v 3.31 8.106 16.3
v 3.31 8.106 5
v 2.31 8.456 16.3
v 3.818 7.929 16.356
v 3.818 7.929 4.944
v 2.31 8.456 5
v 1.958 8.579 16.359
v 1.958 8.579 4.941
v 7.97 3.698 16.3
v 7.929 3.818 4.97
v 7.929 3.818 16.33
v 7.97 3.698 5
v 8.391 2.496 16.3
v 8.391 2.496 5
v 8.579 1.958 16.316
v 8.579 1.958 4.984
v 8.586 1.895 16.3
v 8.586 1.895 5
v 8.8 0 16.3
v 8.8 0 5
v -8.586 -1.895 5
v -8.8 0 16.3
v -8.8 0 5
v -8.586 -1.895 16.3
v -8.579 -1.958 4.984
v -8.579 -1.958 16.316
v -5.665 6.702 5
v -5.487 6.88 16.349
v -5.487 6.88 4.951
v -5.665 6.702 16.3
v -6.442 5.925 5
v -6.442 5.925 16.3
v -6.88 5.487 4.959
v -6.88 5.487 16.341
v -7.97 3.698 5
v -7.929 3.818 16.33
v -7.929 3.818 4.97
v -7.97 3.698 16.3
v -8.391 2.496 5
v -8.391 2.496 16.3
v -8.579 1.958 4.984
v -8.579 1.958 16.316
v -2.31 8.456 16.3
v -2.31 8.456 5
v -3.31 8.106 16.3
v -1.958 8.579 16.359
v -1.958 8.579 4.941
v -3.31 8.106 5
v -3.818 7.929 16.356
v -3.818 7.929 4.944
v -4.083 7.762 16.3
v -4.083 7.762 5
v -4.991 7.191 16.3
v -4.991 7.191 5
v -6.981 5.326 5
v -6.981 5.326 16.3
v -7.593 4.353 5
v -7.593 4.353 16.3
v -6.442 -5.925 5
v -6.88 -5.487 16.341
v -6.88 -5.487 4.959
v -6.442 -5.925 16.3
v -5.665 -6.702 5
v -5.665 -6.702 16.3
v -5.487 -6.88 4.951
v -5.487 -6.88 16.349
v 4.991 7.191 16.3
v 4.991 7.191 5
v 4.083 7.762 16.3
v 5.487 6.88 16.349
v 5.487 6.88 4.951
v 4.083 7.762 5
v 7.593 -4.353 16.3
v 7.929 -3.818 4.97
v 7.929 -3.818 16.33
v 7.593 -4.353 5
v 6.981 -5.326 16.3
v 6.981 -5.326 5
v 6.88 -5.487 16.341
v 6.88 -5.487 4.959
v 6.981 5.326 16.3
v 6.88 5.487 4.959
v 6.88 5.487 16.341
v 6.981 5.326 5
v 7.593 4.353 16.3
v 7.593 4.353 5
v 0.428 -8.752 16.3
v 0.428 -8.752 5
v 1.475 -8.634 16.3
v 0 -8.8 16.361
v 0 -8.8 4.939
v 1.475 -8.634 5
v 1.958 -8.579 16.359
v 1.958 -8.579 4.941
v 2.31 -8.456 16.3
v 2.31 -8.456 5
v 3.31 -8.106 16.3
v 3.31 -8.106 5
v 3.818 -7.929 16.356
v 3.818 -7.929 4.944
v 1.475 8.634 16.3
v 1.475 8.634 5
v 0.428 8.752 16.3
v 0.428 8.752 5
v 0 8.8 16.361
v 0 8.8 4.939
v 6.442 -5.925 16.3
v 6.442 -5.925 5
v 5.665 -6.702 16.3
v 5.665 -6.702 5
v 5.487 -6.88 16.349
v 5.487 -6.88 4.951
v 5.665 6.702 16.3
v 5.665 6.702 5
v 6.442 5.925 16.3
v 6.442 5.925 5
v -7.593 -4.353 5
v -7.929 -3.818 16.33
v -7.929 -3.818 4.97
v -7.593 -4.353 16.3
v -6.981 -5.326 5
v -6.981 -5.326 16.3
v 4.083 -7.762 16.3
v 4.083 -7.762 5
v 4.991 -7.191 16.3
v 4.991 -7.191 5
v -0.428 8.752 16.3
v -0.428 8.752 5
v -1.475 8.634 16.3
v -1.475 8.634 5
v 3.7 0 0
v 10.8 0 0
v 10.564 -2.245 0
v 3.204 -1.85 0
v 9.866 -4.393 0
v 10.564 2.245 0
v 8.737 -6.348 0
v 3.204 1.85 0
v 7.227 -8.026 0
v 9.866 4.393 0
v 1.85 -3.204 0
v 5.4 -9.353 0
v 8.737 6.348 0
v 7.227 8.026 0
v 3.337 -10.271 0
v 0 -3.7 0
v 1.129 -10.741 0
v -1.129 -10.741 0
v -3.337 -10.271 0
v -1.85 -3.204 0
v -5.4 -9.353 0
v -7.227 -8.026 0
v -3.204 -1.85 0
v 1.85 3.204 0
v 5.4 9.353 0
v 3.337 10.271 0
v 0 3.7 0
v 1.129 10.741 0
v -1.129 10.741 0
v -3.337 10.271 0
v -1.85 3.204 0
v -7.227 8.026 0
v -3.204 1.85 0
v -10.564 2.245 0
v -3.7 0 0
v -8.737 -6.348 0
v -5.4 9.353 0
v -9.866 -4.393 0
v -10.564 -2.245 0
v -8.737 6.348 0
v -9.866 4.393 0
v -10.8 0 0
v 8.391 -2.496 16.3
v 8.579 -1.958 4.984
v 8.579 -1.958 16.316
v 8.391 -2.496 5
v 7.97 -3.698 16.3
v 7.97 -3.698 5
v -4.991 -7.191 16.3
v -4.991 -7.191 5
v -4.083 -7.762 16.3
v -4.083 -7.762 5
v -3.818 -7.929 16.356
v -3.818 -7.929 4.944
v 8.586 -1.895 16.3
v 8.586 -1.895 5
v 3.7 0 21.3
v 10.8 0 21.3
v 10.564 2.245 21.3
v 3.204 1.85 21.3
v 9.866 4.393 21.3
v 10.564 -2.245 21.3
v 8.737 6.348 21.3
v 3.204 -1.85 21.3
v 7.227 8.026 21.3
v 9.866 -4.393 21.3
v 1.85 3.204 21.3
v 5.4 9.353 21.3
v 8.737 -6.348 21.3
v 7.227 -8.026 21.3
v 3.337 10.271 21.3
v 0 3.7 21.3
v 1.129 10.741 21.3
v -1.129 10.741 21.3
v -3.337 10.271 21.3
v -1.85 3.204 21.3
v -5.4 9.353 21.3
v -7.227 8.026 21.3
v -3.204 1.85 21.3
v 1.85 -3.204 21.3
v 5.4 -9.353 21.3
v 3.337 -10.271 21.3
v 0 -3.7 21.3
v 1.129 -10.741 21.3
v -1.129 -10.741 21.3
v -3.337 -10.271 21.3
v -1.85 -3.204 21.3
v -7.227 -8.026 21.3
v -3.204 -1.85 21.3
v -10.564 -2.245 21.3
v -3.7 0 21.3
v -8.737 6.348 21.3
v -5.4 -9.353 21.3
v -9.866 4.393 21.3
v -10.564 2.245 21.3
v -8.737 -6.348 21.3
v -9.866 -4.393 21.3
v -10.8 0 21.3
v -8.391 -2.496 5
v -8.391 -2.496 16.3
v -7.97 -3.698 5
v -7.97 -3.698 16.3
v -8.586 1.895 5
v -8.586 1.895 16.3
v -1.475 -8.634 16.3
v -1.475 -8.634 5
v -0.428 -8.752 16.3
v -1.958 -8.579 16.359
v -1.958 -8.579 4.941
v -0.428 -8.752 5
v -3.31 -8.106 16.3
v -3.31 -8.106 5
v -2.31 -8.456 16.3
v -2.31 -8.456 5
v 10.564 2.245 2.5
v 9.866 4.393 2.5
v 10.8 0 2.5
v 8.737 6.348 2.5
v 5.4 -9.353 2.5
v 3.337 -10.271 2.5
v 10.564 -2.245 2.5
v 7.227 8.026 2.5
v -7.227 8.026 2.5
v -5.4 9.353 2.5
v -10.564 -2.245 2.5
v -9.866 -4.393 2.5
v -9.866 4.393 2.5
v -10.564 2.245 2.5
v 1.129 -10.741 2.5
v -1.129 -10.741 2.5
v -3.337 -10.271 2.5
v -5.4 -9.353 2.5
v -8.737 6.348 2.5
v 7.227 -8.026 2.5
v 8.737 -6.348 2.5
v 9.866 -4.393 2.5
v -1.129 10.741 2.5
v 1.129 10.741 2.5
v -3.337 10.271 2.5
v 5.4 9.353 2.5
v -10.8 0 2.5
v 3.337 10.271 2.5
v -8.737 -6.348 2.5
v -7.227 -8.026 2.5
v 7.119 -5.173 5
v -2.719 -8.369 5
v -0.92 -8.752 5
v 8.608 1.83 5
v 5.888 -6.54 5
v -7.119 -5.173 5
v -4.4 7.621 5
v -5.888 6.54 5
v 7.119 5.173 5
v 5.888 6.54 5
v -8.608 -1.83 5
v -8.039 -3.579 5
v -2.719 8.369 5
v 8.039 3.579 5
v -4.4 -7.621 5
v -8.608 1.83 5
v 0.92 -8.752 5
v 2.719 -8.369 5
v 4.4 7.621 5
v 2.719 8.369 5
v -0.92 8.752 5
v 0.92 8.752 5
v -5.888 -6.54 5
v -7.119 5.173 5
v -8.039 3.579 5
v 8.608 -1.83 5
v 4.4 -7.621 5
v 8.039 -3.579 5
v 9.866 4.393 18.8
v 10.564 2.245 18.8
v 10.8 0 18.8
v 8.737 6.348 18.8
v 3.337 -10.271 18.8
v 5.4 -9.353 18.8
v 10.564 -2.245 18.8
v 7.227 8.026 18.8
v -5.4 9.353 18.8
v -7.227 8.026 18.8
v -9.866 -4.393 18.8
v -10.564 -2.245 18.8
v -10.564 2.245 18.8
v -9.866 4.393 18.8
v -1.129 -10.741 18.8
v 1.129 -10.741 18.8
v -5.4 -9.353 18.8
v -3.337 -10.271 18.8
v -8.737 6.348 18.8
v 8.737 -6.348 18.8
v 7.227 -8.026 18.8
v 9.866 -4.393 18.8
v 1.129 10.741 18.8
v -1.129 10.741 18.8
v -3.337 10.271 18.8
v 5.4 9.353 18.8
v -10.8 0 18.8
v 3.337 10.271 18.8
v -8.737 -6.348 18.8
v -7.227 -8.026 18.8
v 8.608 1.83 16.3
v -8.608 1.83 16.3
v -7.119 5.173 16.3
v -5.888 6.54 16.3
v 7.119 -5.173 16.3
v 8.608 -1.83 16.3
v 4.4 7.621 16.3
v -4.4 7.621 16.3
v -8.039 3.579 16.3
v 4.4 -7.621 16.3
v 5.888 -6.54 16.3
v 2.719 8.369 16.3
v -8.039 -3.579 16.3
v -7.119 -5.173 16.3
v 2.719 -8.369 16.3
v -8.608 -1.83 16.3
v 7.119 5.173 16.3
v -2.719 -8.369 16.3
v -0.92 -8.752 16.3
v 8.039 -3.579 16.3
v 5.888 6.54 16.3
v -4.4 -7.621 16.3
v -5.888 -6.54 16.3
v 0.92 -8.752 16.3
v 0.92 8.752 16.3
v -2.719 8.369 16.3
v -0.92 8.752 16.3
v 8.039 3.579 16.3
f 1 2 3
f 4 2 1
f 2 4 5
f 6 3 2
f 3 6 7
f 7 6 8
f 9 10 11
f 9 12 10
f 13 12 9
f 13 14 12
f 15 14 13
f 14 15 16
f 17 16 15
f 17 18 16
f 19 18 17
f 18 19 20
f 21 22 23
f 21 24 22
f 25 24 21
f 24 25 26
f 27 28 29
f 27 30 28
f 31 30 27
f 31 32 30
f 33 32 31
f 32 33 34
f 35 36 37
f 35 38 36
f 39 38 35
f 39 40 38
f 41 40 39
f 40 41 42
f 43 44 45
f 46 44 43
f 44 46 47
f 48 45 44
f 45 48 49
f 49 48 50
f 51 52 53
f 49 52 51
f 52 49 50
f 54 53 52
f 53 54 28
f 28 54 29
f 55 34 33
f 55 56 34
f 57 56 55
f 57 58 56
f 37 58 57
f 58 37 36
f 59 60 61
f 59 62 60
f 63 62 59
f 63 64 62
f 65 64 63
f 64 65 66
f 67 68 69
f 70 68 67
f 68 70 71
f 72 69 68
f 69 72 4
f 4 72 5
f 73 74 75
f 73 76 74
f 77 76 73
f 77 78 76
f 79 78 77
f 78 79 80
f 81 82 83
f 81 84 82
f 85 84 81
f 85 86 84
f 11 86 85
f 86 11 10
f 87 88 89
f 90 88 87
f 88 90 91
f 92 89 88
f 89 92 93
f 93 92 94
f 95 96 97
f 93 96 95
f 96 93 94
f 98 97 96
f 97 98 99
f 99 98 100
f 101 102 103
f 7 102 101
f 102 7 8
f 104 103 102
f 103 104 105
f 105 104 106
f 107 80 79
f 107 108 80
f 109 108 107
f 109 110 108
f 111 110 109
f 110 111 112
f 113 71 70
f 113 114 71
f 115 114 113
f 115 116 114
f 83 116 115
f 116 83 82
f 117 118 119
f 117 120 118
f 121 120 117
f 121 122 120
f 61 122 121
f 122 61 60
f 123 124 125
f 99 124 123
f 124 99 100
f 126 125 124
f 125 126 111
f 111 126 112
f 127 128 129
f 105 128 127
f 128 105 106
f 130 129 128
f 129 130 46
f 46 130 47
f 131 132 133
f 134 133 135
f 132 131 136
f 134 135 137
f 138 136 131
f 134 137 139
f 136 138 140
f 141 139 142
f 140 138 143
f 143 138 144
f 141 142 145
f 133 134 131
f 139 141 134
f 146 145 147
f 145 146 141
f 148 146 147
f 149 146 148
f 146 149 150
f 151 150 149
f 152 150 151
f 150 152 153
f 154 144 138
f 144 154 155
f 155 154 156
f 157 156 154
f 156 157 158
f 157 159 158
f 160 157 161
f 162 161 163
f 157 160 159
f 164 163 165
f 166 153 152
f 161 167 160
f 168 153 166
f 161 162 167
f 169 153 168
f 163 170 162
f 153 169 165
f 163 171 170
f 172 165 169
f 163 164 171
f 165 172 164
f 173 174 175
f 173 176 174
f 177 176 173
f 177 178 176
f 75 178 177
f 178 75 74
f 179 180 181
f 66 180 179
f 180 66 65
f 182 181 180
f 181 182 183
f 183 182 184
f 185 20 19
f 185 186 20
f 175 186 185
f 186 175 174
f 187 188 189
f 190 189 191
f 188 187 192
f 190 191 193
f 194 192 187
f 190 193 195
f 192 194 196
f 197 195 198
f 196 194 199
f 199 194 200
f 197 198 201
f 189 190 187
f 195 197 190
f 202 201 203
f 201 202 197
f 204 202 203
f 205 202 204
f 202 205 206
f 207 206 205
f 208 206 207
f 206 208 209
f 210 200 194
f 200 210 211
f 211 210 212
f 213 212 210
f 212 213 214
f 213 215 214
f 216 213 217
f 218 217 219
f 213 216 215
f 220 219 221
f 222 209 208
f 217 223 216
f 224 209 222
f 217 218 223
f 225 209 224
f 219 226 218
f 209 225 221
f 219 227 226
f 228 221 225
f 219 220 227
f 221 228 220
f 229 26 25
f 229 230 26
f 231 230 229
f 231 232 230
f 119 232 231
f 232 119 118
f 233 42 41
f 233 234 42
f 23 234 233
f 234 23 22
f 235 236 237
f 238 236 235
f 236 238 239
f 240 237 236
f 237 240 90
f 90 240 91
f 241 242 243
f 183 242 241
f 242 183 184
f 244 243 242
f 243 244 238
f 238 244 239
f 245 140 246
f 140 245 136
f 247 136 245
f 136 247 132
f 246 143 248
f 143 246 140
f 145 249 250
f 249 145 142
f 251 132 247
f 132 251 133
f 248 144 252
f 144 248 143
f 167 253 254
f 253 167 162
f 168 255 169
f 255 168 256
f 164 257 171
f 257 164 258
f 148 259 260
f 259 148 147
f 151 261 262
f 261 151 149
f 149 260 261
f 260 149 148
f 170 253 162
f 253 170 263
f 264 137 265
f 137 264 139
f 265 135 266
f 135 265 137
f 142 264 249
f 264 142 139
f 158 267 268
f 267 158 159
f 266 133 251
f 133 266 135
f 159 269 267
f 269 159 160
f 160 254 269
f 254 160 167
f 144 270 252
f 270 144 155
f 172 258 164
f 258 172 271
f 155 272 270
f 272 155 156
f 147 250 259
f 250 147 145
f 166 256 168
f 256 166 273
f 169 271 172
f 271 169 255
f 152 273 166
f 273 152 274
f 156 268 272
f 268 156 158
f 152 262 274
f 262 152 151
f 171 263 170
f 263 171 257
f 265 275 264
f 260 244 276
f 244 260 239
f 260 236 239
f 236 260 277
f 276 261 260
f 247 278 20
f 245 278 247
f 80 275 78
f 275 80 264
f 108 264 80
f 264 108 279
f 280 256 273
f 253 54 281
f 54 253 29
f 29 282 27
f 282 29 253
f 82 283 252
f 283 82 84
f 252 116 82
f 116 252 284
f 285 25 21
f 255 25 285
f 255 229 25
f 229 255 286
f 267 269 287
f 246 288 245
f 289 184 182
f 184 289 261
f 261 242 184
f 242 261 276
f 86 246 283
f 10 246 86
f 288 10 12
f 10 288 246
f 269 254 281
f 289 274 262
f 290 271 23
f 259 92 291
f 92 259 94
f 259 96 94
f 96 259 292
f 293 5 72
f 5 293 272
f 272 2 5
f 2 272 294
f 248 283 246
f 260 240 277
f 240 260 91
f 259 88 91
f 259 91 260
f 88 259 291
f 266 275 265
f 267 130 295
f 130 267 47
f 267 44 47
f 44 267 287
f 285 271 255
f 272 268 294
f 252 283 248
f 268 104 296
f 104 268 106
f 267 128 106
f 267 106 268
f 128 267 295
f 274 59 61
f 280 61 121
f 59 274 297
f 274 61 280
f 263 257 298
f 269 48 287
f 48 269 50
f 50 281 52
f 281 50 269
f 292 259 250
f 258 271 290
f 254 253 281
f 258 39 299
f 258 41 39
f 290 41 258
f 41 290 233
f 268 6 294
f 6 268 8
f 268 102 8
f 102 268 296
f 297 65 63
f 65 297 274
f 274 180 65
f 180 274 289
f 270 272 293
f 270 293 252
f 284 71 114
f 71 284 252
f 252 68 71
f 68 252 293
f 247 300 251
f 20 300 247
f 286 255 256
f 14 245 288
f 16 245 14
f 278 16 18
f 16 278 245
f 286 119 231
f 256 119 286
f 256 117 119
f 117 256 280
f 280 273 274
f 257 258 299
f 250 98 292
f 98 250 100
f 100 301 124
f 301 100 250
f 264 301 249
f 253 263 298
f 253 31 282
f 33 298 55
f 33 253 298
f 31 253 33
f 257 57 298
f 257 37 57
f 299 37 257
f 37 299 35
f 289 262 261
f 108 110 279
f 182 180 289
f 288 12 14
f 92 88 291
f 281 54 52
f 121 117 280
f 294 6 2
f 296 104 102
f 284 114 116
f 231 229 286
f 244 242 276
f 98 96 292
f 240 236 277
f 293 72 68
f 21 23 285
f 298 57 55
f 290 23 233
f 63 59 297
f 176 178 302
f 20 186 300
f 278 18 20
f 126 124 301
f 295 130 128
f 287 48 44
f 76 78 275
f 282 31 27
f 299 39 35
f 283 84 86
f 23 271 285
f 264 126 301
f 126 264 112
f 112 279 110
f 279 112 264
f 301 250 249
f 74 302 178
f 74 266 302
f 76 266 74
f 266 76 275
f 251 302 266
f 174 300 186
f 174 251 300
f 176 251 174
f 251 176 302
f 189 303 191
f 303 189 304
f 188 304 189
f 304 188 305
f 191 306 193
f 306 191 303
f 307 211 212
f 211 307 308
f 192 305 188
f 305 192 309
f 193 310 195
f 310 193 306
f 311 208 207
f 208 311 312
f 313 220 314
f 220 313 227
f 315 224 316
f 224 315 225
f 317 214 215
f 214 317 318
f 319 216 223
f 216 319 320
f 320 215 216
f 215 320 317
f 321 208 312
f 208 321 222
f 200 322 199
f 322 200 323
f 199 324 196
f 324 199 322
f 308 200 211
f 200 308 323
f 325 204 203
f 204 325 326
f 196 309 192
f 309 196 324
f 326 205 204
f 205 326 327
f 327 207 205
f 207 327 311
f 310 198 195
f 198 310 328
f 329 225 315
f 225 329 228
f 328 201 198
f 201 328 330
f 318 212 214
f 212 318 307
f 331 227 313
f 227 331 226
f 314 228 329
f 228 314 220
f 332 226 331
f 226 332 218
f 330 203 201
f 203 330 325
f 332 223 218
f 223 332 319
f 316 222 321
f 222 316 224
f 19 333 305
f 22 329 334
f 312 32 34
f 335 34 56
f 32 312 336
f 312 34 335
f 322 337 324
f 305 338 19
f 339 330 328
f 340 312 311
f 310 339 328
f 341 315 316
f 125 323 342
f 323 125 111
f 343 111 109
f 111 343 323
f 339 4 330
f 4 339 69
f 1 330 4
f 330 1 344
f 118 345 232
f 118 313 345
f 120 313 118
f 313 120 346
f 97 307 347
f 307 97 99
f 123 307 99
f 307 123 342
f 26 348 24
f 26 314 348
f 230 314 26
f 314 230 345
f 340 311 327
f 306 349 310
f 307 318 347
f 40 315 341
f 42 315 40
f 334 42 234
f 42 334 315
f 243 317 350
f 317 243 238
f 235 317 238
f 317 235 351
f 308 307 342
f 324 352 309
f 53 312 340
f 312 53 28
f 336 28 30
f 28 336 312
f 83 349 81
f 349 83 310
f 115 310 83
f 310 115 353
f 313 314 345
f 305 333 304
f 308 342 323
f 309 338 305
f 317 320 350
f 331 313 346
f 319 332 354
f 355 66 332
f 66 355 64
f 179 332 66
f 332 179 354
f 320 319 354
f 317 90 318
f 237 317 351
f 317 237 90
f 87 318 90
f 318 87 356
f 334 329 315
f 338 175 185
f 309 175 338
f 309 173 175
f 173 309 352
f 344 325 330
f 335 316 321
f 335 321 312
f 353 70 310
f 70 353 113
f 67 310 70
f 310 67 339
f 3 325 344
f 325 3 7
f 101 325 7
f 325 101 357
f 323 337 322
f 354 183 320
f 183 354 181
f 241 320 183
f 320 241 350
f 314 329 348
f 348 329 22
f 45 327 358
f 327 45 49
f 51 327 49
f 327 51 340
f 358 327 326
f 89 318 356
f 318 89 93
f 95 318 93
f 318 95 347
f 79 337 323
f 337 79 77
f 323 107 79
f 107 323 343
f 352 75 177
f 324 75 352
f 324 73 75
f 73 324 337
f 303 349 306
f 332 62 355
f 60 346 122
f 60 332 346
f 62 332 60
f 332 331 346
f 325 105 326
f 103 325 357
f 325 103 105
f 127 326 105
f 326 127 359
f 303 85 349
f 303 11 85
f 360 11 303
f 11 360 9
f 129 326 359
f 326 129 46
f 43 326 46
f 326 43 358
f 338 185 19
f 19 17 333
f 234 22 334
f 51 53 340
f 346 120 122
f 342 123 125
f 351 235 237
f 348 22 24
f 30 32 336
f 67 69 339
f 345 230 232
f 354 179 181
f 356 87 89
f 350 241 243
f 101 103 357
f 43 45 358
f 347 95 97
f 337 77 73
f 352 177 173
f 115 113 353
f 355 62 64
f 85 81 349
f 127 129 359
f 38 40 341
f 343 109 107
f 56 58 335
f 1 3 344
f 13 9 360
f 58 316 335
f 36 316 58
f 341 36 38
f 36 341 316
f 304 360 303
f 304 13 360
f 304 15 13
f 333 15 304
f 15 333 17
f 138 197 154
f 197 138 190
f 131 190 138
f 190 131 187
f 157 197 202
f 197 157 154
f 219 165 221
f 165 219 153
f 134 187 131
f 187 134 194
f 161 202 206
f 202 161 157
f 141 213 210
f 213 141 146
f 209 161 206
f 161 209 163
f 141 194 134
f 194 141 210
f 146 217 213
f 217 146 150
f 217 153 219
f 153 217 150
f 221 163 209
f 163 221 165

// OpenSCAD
// [FL_INDEX: keywords="openscad, 3d_parametric, Thread_Spool, csg_solid" | COT="Parametric OpenSCAD design from 3DCodeverse"]
// Title: Thread Spool

/*
Create a thread spool
Created by Mike Creuzer - Mike@Creuzer.com 20120820
Updated 1/14/2013 for Customizer optimization
*/

// Parameters are in mm

// The radius of the spool (half the diameter)
spool_radius = 8.8; // 17.6 / 2 for the toy I used
// The height of the spool
spool_height = 21.3;

// The top and bottom radius
lip_radius = 10.8; // 21.6 / 2 for the toy I used
// The height of the top and bottom
lip_height = 2.5;

// The radius of the whole in the center
spindle_radius = 3.7; // 7.4/2


difference()
{
	union() // Make the spool
	{
		cylinder(r=spool_radius, h=spool_height);
		cylinder(r=lip_radius, h=lip_height);
		translate([0,0,lip_height]) cylinder(r1=lip_radius, r2 = spool_radius, h=lip_height);
		translate([0,0,spool_height-lip_height]) cylinder(r=lip_radius, h=lip_height);
		translate([0,0,spool_height-lip_height-lip_height]) cylinder(r2=lip_radius, r1 = spool_radius, h=lip_height);
	}
	cylinder(r=spindle_radius, h=spool_height); // The hole down the middle
}
